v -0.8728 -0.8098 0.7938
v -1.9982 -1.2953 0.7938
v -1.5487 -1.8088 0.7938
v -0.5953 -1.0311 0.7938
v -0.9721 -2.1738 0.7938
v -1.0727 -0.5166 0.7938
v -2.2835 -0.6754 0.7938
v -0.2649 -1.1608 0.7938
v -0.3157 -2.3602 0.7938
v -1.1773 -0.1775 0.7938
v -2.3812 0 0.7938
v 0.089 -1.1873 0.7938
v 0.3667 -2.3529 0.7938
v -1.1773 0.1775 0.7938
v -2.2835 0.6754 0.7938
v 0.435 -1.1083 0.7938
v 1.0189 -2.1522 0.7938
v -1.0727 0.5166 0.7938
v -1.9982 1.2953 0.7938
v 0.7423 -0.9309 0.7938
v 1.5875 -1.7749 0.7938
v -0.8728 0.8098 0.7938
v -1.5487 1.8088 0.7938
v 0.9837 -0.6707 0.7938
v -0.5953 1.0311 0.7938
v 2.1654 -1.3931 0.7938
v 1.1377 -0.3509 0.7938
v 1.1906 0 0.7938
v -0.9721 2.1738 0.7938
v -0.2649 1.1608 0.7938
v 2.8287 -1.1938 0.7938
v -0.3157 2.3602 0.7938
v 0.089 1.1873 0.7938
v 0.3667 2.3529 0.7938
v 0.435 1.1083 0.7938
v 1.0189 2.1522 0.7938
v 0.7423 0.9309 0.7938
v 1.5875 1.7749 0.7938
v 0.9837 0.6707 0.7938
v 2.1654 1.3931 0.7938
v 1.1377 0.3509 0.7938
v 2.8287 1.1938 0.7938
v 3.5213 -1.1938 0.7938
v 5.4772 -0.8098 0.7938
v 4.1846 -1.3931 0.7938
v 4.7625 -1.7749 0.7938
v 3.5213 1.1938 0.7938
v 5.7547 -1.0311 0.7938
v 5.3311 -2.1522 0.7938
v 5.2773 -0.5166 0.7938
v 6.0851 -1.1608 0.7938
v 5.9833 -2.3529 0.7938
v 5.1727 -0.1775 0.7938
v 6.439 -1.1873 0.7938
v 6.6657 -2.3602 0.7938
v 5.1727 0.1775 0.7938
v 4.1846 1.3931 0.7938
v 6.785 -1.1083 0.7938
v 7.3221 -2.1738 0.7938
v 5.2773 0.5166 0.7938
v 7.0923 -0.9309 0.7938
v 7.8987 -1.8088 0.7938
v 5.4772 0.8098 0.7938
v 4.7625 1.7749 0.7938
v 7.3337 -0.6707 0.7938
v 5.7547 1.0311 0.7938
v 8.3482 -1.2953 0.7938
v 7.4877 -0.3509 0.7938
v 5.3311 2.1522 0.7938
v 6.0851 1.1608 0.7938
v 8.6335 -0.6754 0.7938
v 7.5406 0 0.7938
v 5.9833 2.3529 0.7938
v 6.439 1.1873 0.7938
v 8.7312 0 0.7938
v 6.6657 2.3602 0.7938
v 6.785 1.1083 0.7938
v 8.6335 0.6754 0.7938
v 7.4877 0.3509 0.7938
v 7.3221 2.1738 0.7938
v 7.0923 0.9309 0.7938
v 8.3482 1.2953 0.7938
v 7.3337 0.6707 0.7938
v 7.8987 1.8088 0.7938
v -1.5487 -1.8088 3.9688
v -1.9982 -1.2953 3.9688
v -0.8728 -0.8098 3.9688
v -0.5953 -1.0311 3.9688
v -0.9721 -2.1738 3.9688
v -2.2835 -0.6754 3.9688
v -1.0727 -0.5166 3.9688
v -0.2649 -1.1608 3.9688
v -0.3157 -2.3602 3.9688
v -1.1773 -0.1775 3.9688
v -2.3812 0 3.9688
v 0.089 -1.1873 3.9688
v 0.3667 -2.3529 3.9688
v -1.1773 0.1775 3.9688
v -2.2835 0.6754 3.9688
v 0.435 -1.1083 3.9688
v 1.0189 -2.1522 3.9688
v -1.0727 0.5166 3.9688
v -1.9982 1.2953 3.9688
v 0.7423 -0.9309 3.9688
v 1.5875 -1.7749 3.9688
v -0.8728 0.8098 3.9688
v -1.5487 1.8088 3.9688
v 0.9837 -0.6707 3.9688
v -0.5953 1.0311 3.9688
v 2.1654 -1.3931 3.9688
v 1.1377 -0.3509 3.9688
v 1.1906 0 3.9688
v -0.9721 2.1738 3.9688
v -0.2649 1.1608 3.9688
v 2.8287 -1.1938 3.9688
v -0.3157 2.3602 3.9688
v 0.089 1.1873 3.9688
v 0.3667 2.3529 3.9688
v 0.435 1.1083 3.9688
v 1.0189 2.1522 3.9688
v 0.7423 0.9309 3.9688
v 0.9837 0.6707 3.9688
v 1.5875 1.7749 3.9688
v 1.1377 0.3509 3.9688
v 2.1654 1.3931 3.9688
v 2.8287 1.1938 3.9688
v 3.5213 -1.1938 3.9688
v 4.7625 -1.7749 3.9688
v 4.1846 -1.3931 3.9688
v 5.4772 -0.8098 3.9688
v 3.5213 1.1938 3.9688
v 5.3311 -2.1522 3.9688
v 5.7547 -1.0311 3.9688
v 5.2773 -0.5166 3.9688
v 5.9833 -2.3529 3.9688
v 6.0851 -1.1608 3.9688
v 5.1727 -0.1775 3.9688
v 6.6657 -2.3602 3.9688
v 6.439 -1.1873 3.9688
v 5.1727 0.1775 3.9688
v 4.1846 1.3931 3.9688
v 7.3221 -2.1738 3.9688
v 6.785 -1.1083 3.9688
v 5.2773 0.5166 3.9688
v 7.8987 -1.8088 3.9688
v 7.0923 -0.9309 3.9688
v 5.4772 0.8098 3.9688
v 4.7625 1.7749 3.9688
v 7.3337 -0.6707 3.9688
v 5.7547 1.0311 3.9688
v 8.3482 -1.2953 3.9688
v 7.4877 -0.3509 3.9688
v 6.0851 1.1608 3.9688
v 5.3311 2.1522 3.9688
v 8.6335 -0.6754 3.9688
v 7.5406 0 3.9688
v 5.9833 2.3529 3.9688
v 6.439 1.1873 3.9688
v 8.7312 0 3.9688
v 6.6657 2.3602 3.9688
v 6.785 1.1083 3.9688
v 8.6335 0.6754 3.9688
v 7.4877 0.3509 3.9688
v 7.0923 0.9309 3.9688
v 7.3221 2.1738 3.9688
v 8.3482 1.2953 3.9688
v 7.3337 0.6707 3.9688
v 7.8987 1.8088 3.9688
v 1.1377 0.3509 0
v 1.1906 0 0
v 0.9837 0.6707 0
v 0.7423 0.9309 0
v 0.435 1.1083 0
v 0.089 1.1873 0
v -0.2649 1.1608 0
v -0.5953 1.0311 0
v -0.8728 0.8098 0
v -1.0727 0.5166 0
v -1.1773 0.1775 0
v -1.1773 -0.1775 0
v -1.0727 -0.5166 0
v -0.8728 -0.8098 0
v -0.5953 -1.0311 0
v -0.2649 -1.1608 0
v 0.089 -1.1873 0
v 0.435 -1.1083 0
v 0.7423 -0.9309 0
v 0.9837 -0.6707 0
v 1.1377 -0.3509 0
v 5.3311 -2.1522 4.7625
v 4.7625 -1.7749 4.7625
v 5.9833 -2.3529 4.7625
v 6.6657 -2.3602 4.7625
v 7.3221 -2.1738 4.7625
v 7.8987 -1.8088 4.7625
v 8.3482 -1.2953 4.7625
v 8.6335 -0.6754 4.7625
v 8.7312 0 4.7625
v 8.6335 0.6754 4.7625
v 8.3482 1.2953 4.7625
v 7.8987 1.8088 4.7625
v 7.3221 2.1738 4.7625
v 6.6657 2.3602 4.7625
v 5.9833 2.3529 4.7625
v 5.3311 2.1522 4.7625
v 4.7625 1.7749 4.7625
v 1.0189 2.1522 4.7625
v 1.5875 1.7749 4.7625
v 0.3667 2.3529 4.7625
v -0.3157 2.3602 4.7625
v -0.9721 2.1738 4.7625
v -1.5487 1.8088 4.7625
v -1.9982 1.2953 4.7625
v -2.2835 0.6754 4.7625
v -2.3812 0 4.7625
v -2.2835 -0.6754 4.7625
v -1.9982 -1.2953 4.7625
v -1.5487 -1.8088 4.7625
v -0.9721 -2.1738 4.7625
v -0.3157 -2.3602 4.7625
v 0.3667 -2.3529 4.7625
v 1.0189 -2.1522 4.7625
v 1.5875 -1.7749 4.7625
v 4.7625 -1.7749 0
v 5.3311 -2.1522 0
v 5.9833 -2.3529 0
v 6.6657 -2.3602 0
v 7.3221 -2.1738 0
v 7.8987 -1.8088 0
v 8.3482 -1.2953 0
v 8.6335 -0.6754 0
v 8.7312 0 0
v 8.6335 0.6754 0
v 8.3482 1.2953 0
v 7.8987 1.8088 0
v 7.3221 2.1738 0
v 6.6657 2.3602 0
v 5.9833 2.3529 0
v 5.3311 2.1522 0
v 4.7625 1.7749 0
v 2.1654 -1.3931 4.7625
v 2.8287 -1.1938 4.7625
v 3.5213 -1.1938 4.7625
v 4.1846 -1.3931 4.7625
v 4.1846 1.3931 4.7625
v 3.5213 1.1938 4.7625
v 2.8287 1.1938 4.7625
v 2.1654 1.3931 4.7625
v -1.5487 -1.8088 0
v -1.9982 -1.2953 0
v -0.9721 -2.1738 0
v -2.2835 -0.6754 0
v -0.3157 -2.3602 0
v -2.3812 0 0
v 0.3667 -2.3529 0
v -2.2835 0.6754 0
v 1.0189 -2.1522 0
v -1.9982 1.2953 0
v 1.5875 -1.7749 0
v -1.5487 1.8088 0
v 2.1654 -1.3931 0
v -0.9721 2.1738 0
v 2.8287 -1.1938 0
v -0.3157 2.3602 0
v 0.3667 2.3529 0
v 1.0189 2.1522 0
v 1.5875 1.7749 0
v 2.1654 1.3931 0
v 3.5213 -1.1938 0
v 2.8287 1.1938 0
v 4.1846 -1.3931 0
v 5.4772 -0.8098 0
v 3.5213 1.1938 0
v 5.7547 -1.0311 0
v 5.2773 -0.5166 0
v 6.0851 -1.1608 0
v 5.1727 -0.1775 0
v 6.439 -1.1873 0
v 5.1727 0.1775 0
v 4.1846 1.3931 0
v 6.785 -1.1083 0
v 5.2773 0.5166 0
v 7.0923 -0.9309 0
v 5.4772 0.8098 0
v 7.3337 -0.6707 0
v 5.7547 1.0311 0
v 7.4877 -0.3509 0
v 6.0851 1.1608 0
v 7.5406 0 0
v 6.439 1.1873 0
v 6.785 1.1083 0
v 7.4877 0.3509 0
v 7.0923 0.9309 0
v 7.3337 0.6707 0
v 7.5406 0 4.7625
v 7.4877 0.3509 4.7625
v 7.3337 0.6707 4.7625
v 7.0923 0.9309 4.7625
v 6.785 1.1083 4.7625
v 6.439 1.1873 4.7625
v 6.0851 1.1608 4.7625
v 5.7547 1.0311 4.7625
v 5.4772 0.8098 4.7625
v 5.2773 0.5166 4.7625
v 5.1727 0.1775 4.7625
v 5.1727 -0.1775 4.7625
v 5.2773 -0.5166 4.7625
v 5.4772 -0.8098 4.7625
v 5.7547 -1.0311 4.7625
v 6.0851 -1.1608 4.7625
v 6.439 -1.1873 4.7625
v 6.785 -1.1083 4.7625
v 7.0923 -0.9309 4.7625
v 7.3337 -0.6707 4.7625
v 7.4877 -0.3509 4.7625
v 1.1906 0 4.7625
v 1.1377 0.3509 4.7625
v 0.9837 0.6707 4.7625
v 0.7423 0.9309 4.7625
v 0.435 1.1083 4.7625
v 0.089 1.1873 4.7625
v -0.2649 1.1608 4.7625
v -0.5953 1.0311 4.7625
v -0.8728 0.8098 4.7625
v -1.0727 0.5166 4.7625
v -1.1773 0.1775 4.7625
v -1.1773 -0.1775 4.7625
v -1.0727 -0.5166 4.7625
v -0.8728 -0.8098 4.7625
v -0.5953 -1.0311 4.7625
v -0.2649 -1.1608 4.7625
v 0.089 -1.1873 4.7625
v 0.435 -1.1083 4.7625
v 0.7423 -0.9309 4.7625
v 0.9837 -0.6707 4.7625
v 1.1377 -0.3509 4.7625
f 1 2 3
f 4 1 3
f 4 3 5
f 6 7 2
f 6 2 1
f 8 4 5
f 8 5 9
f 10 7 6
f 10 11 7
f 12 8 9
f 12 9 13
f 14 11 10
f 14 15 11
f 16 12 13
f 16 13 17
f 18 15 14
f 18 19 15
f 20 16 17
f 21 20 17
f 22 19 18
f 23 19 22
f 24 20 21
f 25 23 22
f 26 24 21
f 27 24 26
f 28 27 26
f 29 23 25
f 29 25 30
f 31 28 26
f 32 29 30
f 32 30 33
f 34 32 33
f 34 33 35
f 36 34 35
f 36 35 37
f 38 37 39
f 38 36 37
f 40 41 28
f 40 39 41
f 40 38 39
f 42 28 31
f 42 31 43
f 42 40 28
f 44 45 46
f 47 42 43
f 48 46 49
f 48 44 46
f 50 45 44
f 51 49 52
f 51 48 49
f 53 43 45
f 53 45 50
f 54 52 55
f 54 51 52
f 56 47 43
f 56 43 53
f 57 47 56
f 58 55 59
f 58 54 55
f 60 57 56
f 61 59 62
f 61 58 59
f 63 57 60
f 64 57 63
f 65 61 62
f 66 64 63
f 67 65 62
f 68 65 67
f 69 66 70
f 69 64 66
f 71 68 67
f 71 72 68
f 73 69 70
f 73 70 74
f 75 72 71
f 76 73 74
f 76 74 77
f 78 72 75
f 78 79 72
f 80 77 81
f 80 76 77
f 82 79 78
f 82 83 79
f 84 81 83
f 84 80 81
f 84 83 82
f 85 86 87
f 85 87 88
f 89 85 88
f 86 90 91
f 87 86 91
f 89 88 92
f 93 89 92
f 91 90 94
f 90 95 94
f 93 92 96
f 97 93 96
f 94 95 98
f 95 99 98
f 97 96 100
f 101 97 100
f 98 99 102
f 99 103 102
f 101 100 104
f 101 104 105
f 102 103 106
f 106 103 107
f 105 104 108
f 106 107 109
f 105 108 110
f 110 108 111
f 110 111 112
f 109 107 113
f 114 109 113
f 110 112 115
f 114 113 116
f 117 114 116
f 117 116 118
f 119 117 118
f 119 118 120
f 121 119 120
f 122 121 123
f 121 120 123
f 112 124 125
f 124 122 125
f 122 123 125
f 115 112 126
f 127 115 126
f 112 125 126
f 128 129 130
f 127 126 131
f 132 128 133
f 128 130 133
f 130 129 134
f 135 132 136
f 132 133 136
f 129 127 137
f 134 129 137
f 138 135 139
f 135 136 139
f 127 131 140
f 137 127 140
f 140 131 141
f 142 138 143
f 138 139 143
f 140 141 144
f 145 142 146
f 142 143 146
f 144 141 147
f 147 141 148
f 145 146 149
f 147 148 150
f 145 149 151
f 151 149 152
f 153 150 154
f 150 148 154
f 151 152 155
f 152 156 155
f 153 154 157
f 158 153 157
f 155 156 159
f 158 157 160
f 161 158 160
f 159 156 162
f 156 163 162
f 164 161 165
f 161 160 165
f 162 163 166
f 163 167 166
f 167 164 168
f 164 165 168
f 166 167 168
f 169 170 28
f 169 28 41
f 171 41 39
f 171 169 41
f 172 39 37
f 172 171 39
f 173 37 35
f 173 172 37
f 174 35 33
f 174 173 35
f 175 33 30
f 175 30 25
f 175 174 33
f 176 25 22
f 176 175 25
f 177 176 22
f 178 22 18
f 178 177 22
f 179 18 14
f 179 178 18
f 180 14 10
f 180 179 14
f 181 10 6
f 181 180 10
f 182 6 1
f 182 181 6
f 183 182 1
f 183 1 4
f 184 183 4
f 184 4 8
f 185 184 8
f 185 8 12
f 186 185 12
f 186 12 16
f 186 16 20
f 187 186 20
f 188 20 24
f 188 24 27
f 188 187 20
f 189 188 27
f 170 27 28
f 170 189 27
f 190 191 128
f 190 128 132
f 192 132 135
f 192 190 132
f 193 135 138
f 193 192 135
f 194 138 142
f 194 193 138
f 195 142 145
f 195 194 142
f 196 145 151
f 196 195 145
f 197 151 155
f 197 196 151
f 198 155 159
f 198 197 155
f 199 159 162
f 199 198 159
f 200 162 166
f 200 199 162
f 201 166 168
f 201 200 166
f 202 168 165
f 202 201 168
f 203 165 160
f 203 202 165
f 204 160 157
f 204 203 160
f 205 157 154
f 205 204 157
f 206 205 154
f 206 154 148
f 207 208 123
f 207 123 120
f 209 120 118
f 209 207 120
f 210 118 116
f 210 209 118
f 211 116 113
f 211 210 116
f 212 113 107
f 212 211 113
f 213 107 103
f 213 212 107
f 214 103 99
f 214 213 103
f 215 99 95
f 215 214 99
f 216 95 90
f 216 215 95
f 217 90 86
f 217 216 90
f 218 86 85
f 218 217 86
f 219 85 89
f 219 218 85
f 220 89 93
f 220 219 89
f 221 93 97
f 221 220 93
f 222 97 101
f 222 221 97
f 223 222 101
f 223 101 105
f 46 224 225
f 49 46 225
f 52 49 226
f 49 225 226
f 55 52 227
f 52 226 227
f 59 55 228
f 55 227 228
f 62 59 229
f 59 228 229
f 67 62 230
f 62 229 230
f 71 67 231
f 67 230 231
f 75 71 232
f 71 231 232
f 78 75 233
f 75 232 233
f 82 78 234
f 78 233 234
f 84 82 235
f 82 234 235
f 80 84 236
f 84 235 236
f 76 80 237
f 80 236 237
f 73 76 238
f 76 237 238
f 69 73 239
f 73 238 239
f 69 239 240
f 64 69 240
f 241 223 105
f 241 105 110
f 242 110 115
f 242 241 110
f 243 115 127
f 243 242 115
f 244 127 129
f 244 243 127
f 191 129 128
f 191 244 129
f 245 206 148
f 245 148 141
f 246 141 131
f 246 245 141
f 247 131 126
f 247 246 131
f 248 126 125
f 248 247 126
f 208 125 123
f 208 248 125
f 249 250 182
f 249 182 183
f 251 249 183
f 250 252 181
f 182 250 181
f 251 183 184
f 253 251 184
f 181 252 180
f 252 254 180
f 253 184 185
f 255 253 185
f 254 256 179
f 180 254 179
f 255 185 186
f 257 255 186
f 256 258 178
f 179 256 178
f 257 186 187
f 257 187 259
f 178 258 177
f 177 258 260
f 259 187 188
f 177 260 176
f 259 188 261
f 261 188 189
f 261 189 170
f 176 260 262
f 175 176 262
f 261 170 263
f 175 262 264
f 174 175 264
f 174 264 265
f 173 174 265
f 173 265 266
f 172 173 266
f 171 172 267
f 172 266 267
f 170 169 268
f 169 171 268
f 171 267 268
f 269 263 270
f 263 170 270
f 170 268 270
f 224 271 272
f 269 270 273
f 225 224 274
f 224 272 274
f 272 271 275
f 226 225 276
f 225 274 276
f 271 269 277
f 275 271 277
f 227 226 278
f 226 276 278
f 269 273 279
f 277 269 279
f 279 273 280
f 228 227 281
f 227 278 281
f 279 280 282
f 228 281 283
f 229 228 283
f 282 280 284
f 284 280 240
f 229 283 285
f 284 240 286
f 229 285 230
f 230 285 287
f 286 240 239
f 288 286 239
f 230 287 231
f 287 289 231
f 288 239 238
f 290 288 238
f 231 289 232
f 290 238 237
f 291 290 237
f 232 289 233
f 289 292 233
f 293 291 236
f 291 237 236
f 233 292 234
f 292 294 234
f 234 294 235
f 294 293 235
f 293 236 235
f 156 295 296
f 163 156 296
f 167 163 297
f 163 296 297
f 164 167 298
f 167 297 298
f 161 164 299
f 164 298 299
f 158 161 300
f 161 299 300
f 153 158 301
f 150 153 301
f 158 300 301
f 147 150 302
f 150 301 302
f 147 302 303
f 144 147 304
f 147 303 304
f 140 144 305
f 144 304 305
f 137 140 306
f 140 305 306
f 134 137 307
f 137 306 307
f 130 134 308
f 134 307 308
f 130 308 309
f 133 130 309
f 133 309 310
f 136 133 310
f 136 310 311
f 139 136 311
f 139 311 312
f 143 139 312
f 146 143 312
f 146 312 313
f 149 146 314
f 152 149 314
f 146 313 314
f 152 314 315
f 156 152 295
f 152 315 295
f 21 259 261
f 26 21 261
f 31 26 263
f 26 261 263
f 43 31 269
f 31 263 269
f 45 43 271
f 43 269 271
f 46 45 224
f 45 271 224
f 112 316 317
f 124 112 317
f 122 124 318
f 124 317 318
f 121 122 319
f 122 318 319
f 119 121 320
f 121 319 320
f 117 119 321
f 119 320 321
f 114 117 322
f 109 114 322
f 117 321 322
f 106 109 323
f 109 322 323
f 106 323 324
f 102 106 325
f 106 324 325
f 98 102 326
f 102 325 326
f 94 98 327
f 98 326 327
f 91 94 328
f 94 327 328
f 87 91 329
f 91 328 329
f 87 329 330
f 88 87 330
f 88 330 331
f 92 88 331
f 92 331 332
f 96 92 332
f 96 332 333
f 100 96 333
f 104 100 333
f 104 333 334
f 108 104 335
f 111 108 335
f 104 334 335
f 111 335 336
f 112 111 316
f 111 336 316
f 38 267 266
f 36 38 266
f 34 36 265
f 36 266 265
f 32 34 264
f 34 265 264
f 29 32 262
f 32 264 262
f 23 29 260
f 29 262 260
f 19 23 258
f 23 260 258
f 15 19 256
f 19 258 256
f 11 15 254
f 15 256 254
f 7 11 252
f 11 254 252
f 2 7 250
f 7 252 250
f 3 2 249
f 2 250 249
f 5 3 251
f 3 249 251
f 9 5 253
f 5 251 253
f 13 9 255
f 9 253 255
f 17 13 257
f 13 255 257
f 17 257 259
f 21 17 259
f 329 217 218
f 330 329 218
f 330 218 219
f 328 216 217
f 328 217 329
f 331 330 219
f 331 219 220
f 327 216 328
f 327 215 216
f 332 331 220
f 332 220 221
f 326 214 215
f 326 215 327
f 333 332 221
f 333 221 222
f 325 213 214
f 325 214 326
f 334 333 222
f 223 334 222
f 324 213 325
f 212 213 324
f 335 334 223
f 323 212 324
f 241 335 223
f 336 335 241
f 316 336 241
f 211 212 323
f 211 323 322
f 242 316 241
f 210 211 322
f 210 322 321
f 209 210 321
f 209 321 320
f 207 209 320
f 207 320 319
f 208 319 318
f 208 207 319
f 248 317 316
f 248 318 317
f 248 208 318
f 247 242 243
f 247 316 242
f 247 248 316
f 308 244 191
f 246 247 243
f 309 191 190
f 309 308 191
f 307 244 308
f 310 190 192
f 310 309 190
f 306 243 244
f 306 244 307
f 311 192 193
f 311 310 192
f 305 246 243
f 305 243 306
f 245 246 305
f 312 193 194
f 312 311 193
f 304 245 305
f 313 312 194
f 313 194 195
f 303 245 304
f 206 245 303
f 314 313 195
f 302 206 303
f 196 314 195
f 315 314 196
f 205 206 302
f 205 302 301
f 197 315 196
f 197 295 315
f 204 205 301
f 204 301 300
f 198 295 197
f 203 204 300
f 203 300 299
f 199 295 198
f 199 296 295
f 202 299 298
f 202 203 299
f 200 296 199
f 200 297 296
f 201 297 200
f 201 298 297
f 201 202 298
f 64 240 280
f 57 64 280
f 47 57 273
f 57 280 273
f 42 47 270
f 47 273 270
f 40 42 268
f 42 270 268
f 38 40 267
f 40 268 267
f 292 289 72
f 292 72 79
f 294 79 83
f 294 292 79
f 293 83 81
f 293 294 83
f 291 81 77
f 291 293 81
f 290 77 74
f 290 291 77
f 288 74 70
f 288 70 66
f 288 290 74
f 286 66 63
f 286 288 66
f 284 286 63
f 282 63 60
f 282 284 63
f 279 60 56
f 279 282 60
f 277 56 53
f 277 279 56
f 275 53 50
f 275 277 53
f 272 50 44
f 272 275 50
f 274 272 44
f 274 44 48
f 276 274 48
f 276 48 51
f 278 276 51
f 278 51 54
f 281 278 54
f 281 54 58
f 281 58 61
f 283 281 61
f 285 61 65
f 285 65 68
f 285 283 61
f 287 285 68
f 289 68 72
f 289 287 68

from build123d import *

# Parameters (mm, degrees)
SKETCH2_R           = 2.38125
SKETCH2_R_2         = 1.190625
BOSS_EXTRUDE1_DEPTH = 0.79375
SKETCH3_R           = 2.69875
SKETCH3_R_2         = 1.190625
BOSS_EXTRUDE2_DEPTH = 0.79375
BOSS_EXTRUDE3_START = 0.79375
SKETCH3_4_R         = 1.190625
BOSS_EXTRUDE3_DEPTH = 3.175


with BuildPart() as part:
    # Sketch2 → Boss-Extrude1 (new body)
    # profile 1 of 3: a face of its own
    with BuildSketch(Plane.XY):
        Circle(SKETCH2_R)
        Circle(SKETCH2_R_2, mode=Mode.SUBTRACT)
    # profile 2 of 3: a face of its own
    with BuildSketch(Plane.XY):
        with BuildLine():
            ThreePointArc((1.5875, 1.774878957), (2.1737739, 0.972141242), (2.38125, 0))
            ThreePointArc((2.38125, 0), (2.1737739, -0.972141242), (1.5875, -1.774878957))
            ThreePointArc((1.5875, -1.774878957), (3.175, -1.168507914), (4.7625, -1.774878957))
            ThreePointArc((4.7625, -1.774878957), (3.96875, 0), (4.7625, 1.774878957))
            ThreePointArc((4.7625, 1.774878957), (3.175, 1.168507914), (1.5875, 1.774878957))
        make_face()
    # profile 3 of 3: a face of its own
    with BuildSketch(Plane.XY):
        with Locations((6.35, 0)):
            Circle(SKETCH2_R)
        with Locations((6.35, 0)):
            Circle(SKETCH2_R_2, mode=Mode.SUBTRACT)
    extrude(amount=BOSS_EXTRUDE1_DEPTH)


with BuildPart() as body_2:
    # Sketch3 → Boss-Extrude2 (new body)
    # profile 1 of 4: a face of its own
    with BuildSketch(Plane(origin=(0, 0, 0), x_dir=(-1, 0, 0), z_dir=(0, 0, -1))):
        with Locations((-12.7, 0)):
            Circle(SKETCH3_R)
        with Locations((-12.7, 0)):
            Circle(SKETCH3_R_2, mode=Mode.SUBTRACT)
    # profile 2 of 4: a face of its own
    with BuildSketch(Plane(origin=(0, 0, 0), x_dir=(-1, 0, 0), z_dir=(0, 0, -1))):
        with BuildLine():
            ThreePointArc((-3.65125, 0), (-3.737895814, 0.678353361), (-3.99226957, 1.313148424))
            ThreePointArc((-3.99226957, 1.313148424), (-4.399347966, 1.507376065), (-4.7625, 1.774878957))
            ThreePointArc((-4.7625, 1.774878957), (-8.73125, 0), (-4.7625, -1.774878957))
            ThreePointArc((-4.7625, -1.774878957), (-4.399347966, -1.507376065), (-3.99226957, -1.313148424))
            ThreePointArc((-3.99226957, -1.313148424), (-3.737895814, -0.678353361), (-3.65125, 0))
        make_face()
        with Locations(Location((-6.35, 0, 0), (0, 0, 180))):
            Circle(SKETCH3_R_2, mode=Mode.SUBTRACT)
    # profile 3 of 4: a face of its own
    with BuildSketch(Plane(origin=(0, 0, 0), x_dir=(-1, 0, 0), z_dir=(0, 0, -1))):
        with BuildLine():
            ThreePointArc((-3.99226957, 1.313148424), (-5.769279961, 2.63552951), (-7.9375, 2.182451675))
            ThreePointArc((-7.9375, 2.182451675), (-9.04875, 0), (-7.9375, -2.182451675))
            ThreePointArc((-7.9375, -2.182451675), (-5.769279961, -2.63552951), (-3.99226957, -1.313148424))
            ThreePointArc((-3.99226957, -1.313148424), (-4.399347966, -1.507376065), (-4.7625, -1.774878957))
            ThreePointArc((-4.7625, -1.774878957), (-8.73125, 0), (-4.7625, 1.774878957))
            ThreePointArc((-4.7625, 1.774878957), (-4.399347966, 1.507376065), (-3.99226957, 1.313148424))
        make_face()
    # profile 4 of 4: a face of its own
    with BuildSketch(Plane(origin=(0, 0, 0), x_dir=(-1, 0, 0), z_dir=(0, 0, -1))):
        with BuildLine():
            ThreePointArc((-7.9375, -2.182451675), (-9.04875, 0), (-7.9375, 2.182451675))
            ThreePointArc((-7.9375, 2.182451675), (-9.525, 1.666153349), (-11.1125, 2.182451675))
            ThreePointArc((-11.1125, 2.182451675), (-10.295055387, 1.224537859), (-10.00125, 0))
            ThreePointArc((-10.00125, 0), (-10.295055387, -1.224537859), (-11.1125, -2.182451675))
            ThreePointArc((-11.1125, -2.182451675), (-9.525, -1.666153349), (-7.9375, -2.182451675))
        make_face()
    extrude(amount=BOSS_EXTRUDE2_DEPTH)

    # Sketch3<4> → Boss-Extrude3 (add)
    with BuildSketch(Plane(origin=(0, 0, 0), x_dir=(-1, 0, 0), z_dir=(0, 0, -1)).offset(BOSS_EXTRUDE3_START)):
        with Locations(Location((-6.35, 0, 0), (0, 0, 180))):
            Circle(SKETCH3_4_R)
        with Locations((-12.7, 0)):
            Circle(SKETCH3_4_R)
    extrude(amount=-BOSS_EXTRUDE3_DEPTH)


with BuildPart() as body_3:
    # Mirror1: mirrored copy
    add(body_2.part.mirror(Plane(origin=(6.35, 0, 2.38125), x_dir=(1, 0, 0), z_dir=(0, 0, -1))))


with BuildPart() as body_4:
    # Mirror1 2: mirrored copy
    add(part.part.mirror(Plane(origin=(6.35, 0, 2.38125), x_dir=(1, 0, 0), z_dir=(0, 0, -1))))


with BuildPart() as body_2_1:
    add(body_2.part)

    # Combine1: union body 3
    add(body_3.part)


solid = Compound([part.part, body_4.part])
